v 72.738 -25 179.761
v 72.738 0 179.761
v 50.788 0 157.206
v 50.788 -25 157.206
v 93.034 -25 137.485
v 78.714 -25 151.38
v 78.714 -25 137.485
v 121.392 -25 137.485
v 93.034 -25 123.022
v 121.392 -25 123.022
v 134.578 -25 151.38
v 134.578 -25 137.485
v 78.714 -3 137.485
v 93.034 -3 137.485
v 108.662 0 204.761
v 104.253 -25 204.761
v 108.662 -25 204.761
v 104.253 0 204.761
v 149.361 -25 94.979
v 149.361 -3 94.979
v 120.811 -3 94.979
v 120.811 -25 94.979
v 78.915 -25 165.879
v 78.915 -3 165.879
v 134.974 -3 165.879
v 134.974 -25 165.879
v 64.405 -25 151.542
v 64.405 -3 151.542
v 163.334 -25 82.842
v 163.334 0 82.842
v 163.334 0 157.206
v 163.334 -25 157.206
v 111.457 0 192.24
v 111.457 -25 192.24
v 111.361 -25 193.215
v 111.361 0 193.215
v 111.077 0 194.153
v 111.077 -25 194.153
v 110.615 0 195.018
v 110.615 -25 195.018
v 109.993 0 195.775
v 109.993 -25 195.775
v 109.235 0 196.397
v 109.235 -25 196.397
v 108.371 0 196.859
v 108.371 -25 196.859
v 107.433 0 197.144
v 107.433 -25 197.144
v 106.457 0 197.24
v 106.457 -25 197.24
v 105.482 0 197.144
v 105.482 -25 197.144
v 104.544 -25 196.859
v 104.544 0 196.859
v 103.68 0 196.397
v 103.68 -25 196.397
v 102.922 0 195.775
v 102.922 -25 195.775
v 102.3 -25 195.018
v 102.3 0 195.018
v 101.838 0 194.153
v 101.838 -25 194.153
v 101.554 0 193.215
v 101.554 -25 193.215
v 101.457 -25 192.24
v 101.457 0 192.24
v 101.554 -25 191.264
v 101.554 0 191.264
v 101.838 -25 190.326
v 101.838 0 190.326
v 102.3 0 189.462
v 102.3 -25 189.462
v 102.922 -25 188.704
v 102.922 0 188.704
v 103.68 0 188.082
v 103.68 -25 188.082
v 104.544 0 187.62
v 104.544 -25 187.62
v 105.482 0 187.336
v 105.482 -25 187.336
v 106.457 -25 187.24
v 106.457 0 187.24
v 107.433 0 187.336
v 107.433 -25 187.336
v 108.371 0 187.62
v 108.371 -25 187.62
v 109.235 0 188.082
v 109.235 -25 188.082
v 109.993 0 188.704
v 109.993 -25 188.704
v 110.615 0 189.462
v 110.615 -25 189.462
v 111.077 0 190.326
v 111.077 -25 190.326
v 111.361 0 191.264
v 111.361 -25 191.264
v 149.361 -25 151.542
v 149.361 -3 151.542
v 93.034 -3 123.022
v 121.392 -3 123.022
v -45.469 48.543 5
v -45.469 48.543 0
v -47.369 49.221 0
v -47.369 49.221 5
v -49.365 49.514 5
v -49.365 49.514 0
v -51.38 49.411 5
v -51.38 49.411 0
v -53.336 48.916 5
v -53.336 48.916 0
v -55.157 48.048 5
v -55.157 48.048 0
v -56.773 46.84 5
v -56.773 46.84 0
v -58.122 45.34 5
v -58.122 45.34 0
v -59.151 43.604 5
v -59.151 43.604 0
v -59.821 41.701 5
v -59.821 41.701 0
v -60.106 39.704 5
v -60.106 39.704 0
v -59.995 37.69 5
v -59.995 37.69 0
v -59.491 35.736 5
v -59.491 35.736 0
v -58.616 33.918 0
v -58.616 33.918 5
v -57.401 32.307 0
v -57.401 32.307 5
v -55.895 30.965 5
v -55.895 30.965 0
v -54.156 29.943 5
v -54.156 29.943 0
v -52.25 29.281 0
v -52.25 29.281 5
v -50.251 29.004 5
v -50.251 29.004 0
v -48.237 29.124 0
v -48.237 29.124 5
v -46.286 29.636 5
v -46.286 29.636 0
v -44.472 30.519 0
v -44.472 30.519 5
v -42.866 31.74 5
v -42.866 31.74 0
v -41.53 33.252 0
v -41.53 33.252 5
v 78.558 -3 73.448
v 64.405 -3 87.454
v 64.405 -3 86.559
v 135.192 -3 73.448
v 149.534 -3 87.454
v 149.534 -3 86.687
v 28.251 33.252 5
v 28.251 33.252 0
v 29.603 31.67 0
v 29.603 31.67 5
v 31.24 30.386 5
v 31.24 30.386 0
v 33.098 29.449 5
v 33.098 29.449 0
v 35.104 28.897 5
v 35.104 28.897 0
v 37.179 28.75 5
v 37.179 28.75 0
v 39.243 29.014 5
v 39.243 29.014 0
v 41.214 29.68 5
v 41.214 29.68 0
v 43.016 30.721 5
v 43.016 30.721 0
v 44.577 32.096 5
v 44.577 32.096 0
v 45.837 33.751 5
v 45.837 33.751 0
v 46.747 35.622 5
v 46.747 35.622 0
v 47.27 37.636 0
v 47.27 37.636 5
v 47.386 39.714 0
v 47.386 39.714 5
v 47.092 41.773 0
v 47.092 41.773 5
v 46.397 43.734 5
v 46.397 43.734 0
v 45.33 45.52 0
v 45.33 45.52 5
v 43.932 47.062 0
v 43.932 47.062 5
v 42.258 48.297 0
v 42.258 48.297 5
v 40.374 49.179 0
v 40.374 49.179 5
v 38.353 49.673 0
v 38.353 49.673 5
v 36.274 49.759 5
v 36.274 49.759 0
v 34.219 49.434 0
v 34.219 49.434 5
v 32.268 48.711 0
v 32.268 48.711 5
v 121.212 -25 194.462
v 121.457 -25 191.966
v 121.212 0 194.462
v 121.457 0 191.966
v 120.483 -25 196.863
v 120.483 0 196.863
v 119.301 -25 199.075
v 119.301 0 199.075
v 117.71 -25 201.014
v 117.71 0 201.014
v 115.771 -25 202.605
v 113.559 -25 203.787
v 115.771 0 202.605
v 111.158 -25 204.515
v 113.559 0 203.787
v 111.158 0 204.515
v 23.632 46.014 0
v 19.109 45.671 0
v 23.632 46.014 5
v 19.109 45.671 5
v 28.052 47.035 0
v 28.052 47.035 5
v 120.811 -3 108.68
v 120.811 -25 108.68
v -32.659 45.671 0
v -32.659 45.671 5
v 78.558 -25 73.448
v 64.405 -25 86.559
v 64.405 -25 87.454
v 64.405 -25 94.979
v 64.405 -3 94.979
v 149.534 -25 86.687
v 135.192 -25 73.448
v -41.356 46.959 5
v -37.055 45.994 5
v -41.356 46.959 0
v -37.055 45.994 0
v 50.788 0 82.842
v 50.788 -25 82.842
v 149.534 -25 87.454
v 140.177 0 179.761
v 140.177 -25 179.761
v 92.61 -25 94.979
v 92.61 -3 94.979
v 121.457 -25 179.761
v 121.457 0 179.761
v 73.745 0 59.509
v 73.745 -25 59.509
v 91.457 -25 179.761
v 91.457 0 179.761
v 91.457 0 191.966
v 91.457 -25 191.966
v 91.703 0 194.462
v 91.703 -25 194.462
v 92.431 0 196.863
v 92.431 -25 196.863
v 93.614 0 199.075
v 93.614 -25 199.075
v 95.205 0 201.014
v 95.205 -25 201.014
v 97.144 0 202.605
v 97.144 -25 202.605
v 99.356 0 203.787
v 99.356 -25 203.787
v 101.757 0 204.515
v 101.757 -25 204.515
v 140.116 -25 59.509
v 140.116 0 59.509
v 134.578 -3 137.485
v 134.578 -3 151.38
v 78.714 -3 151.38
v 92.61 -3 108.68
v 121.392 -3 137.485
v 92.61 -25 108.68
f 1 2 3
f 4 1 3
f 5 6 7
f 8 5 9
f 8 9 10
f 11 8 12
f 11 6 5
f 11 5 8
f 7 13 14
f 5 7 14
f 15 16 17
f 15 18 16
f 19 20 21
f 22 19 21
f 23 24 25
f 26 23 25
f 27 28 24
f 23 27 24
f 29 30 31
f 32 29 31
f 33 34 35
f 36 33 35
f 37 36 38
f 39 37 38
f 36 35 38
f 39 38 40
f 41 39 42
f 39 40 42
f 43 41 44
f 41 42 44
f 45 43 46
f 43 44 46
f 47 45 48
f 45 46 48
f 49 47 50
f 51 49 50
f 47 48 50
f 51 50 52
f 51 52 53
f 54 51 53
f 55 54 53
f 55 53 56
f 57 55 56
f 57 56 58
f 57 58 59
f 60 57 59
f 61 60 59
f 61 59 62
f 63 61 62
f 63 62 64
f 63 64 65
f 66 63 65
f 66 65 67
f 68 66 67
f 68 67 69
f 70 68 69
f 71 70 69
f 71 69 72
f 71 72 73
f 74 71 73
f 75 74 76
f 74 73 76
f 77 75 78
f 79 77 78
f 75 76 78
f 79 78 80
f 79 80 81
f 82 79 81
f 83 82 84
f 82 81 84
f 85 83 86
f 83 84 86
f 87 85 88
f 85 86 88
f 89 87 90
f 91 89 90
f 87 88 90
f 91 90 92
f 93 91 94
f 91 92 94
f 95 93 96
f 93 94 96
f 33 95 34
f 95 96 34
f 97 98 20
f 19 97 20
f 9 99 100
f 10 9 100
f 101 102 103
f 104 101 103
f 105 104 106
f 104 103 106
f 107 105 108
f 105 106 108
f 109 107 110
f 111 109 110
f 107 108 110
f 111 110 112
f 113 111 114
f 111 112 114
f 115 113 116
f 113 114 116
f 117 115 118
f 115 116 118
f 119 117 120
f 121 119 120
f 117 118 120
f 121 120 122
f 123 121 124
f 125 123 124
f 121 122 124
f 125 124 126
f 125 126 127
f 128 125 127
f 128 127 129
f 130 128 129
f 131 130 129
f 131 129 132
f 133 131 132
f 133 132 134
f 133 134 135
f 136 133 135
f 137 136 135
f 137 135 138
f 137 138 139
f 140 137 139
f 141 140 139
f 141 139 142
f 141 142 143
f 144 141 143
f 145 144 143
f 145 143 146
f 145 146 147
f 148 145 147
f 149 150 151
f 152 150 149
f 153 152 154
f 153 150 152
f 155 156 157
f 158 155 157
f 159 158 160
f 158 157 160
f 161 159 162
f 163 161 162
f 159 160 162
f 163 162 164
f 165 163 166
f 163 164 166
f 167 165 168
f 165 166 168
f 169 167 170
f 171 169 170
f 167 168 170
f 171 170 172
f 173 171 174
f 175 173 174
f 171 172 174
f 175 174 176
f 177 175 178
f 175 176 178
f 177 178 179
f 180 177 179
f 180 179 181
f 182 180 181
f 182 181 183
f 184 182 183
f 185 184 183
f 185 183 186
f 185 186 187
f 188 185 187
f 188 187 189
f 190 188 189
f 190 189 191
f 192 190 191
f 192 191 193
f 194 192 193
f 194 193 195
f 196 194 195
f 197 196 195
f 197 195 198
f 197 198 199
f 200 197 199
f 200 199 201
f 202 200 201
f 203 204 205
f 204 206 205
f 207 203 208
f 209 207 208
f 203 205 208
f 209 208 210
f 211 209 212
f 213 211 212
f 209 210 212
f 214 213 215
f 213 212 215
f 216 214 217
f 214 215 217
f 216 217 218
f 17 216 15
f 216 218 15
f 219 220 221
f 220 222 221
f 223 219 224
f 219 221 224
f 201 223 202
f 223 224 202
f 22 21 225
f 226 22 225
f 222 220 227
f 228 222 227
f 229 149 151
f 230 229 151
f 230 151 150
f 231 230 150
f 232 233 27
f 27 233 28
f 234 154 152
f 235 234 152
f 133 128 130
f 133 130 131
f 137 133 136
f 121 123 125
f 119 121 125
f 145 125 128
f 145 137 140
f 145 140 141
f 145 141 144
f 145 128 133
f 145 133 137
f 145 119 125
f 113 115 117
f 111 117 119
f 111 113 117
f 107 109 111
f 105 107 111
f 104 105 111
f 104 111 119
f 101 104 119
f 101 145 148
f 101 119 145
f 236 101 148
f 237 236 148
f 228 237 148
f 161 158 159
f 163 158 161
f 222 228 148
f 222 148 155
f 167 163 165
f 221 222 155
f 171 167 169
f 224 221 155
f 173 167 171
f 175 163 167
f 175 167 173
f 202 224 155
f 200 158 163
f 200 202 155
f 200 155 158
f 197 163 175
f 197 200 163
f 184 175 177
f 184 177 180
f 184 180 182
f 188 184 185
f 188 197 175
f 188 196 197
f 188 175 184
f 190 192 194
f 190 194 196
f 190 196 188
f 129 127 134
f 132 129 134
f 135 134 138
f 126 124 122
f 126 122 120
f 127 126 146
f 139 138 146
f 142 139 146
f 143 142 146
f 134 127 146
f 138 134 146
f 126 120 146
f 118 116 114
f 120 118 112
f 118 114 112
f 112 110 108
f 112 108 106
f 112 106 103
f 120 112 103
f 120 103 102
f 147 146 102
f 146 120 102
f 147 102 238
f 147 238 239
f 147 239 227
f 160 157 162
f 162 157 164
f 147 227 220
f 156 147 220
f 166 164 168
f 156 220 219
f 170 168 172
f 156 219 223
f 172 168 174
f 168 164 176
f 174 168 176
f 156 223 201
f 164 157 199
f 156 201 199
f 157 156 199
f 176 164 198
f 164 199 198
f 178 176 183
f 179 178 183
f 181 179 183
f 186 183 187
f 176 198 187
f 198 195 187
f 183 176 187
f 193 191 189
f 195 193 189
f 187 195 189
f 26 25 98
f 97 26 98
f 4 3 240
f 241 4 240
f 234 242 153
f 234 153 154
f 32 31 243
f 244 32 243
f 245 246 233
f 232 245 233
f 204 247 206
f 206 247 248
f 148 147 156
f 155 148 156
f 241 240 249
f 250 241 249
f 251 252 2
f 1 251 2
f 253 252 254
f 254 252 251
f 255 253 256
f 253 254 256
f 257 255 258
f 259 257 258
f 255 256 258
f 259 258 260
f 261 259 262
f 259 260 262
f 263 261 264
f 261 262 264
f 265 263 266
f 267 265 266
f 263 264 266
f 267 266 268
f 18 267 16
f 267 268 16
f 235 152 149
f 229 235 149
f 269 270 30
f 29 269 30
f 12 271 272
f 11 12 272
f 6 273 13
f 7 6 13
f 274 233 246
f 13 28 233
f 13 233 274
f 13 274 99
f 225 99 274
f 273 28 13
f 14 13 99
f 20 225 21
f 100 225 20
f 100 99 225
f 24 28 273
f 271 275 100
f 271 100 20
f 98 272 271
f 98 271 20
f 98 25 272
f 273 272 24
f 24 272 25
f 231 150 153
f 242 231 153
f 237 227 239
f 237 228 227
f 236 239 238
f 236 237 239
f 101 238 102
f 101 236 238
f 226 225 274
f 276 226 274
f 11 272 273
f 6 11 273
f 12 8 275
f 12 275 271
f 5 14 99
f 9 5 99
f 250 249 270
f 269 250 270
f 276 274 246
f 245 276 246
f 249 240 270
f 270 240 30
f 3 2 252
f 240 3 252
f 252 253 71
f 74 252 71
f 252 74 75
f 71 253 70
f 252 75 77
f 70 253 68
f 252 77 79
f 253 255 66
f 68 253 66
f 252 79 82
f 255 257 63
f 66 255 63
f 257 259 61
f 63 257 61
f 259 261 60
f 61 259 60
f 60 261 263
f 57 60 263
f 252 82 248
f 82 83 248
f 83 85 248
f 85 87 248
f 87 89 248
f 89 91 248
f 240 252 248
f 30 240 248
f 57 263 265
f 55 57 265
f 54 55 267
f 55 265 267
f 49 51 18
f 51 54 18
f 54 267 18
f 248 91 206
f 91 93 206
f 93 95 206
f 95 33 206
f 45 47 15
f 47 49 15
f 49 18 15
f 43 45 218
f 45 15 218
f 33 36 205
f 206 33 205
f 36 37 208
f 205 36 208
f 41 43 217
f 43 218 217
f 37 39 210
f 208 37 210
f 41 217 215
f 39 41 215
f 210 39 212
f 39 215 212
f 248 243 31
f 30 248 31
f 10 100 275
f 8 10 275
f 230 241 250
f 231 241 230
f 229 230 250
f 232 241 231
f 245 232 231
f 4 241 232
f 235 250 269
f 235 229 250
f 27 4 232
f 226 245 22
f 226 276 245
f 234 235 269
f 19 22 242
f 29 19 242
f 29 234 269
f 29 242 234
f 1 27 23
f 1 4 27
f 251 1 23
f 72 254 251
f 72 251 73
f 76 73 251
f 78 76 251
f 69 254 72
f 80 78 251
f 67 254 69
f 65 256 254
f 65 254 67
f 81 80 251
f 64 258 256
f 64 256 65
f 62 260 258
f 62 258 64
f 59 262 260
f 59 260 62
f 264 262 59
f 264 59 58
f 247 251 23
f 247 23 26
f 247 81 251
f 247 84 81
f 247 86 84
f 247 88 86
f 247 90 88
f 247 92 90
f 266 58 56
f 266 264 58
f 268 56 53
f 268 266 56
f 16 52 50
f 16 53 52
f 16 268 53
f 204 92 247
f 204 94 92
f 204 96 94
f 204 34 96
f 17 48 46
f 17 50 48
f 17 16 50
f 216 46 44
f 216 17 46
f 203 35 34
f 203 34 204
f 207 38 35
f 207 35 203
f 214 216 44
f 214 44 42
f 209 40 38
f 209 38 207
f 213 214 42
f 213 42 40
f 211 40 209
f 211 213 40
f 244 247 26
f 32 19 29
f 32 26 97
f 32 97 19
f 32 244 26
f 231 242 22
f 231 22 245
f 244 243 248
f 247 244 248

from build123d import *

# Parameters (mm, degrees)
F1_DEPTH  = 5
F2_R      = 30
F4_DEPTH  = 25
F5_DEPTH  = 3
F7_DEPTH  = 25
F8_R      = 12.7953318806
F9_R      = 5
F10_DEPTH = 44.9


with BuildPart() as f1:
    # F0 (on Top) → F1 (new body)
    with BuildSketch(Plane.XY):
        with BuildLine():
            Line((28.5444660827, 45.6706248224), (-41.8340807416, 45.6706248224))
            ThreePointArc((-41.8340807416, 45.6706248224), (-60.1126889079, 39.0092747627), (-41.5295811212, 33.2517400384))
            Line((-41.5295811212, 33.2517400384), (28.2512136258, 33.2517400384))
            ThreePointArc((28.2512136258, 33.2517400384), (47.393178108, 39.0126373548), (28.5444660827, 45.6706248224))
        make_face()
    extrude(amount=F1_DEPTH)

    # F2
    f2_edges = [f1.edges().sort_by_distance(p)[0] for p in [
        (-41.834081, 45.670625, 2.5),
        (28.544466, 45.670625, 2.5),
    ]]
    fillet(f2_edges, radius=F2_R)


with BuildPart() as f4:
    # F3 (on Front) → F4 (new body)
    with BuildSketch(Plane.XZ):
        Polygon((72.738096118, 179.7612905502), (50.7878139615, 157.2058796883), (50.7878139615, 82.8419774771), (73.7452038377, 59.5086589456), (140.1162296534, 59.5086589456), (163.3339077234, 82.8419774771), (163.3339077234, 157.2058796883), (140.1768028736, 179.7612905502), (74.6252834797, 179.7612905502), align=None)
        Polygon((64.4049271941, 86.5594475049), (64.4049271941, 87.4538868666), (149.5340764523, 87.4538868666), (149.5340764523, 86.6874158382), (135.1918131113, 73.4484046698), (78.5582363605, 73.4484046698), align=None, mode=Mode.SUBTRACT)
        Polygon((64.4049271941, 94.9794501066), (64.4049271941, 151.5417098999), (78.9152383804, 165.8793836832), (134.9744051695, 165.8793836832), (149.3608653545, 151.5417098999), (149.3608653545, 94.9794501066), (120.8112314343, 94.9794501066), (120.8112314343, 108.6802631617), (92.6103889942, 108.6802631617), (92.6103889942, 94.9794501066), align=None, mode=Mode.SUBTRACT)
    extrude(amount=F4_DEPTH)



with BuildPart() as f4b:
    # F3 (on Front) → F4, piece 2 (new body)
    with BuildSketch(Plane.XZ):
        Polygon((106.6459603608, 151.3798683882), (78.7138864398, 151.3798683882), (78.7138864398, 137.48472929), (93.0343940854, 137.48472929), (93.0343940854, 123.0224370956), (106.6459603608, 123.0224370956), align=None)
        Polygon((134.5780342817, 151.3798683882), (106.6459603608, 151.3798683882), (106.6459603608, 123.0224370956), (120.2575266361, 123.0224370956), (121.3918328285, 123.0224370956), (121.3918328285, 137.48472929), (134.5780342817, 137.48472929), align=None)
    extrude(amount=F4_DEPTH)


with BuildPart() as f4_1:
    add(f4.part)

    add(f4b.part)  # F5 merges F4b
    # F3 (on Front) → F5 (join)
    with BuildSketch(Plane.XZ):
        Polygon((72.738096118, 179.7612905502), (50.7878139615, 157.2058796883), (50.7878139615, 82.8419774771), (73.7452038377, 59.5086589456), (140.1162296534, 59.5086589456), (163.3339077234, 82.8419774771), (163.3339077234, 157.2058796883), (140.1768028736, 179.7612905502), (74.6252834797, 179.7612905502), align=None)
        Polygon((64.4049271941, 86.5594475049), (64.4049271941, 87.4538868666), (149.5340764523, 87.4538868666), (149.5340764523, 86.6874158382), (135.1918131113, 73.4484046698), (78.5582363605, 73.4484046698), align=None, mode=Mode.SUBTRACT)
        Polygon((64.4049271941, 94.9794501066), (64.4049271941, 151.5417098999), (78.9152383804, 165.8793836832), (134.9744051695, 165.8793836832), (149.3608653545, 151.5417098999), (149.3608653545, 94.9794501066), (120.8112314343, 94.9794501066), (120.8112314343, 108.6802631617), (92.6103889942, 108.6802631617), (92.6103889942, 94.9794501066), align=None, mode=Mode.SUBTRACT)
        Polygon((78.9152383804, 165.8793836832), (64.4049271941, 151.5417098999), (64.4049271941, 94.9794501066), (92.6103889942, 94.9794501066), (92.6103889942, 108.6802631617), (120.8112314343, 108.6802631617), (120.8112314343, 94.9794501066), (149.3608653545, 94.9794501066), (149.3608653545, 151.5417098999), (134.9744051695, 165.8793836832), align=None)
        Polygon((78.7138864398, 137.48472929), (78.7138864398, 151.3798683882), (106.6459603608, 151.3798683882), (134.5780342817, 151.3798683882), (134.5780342817, 137.48472929), (121.3918328285, 137.48472929), (121.3918328285, 123.0224370956), (120.2575266361, 123.0224370956), (106.6459603608, 123.0224370956), (93.0343940854, 123.0224370956), (93.0343940854, 137.48472929), align=None, mode=Mode.SUBTRACT)
        Polygon((149.5340764523, 87.4538868666), (64.4049271941, 87.4538868666), (64.4049271941, 86.5594475049), (78.5582363605, 73.4484046698), (135.1918131113, 73.4484046698), (149.5340764523, 86.6874158382), align=None)
        Polygon((134.5780342817, 151.3798683882), (106.6459603608, 151.3798683882), (106.6459603608, 123.0224370956), (120.2575266361, 123.0224370956), (121.3918328285, 123.0224370956), (121.3918328285, 137.48472929), (134.5780342817, 137.48472929), align=None)
        Polygon((106.6459603608, 151.3798683882), (78.7138864398, 151.3798683882), (78.7138864398, 137.48472929), (93.0343940854, 137.48472929), (93.0343940854, 123.0224370956), (106.6459603608, 123.0224370956), align=None)
    extrude(amount=F5_DEPTH)

    # F6 (on face) → F7 (join)
    with BuildSketch(Plane.XY.offset(179.7612905502)):
        Polygon((91.4574494958, -25), (106.4574494958, -25), (121.4574494958, -25), (121.4574494958, 0), (91.4574494958, 0), align=None)
    extrude(amount=F7_DEPTH)

    # F8
    f8_edges = [f4_1.edges().sort_by_distance(p)[0] for p in [
        (91.457449, -12.5, 204.761291),
        (121.457449, -12.5, 204.761291),
    ]]
    fillet(f8_edges, radius=F8_R)

    # F9 (on face) → F10 (cut)
    with BuildSketch(Plane.XZ.offset(25)):
        with Locations((106.4574494958, 192.2397883682)):
            Circle(F9_R)
    extrude(amount=-F10_DEPTH, mode=Mode.SUBTRACT)


solid = Compound([f1.part, f4_1.part])
